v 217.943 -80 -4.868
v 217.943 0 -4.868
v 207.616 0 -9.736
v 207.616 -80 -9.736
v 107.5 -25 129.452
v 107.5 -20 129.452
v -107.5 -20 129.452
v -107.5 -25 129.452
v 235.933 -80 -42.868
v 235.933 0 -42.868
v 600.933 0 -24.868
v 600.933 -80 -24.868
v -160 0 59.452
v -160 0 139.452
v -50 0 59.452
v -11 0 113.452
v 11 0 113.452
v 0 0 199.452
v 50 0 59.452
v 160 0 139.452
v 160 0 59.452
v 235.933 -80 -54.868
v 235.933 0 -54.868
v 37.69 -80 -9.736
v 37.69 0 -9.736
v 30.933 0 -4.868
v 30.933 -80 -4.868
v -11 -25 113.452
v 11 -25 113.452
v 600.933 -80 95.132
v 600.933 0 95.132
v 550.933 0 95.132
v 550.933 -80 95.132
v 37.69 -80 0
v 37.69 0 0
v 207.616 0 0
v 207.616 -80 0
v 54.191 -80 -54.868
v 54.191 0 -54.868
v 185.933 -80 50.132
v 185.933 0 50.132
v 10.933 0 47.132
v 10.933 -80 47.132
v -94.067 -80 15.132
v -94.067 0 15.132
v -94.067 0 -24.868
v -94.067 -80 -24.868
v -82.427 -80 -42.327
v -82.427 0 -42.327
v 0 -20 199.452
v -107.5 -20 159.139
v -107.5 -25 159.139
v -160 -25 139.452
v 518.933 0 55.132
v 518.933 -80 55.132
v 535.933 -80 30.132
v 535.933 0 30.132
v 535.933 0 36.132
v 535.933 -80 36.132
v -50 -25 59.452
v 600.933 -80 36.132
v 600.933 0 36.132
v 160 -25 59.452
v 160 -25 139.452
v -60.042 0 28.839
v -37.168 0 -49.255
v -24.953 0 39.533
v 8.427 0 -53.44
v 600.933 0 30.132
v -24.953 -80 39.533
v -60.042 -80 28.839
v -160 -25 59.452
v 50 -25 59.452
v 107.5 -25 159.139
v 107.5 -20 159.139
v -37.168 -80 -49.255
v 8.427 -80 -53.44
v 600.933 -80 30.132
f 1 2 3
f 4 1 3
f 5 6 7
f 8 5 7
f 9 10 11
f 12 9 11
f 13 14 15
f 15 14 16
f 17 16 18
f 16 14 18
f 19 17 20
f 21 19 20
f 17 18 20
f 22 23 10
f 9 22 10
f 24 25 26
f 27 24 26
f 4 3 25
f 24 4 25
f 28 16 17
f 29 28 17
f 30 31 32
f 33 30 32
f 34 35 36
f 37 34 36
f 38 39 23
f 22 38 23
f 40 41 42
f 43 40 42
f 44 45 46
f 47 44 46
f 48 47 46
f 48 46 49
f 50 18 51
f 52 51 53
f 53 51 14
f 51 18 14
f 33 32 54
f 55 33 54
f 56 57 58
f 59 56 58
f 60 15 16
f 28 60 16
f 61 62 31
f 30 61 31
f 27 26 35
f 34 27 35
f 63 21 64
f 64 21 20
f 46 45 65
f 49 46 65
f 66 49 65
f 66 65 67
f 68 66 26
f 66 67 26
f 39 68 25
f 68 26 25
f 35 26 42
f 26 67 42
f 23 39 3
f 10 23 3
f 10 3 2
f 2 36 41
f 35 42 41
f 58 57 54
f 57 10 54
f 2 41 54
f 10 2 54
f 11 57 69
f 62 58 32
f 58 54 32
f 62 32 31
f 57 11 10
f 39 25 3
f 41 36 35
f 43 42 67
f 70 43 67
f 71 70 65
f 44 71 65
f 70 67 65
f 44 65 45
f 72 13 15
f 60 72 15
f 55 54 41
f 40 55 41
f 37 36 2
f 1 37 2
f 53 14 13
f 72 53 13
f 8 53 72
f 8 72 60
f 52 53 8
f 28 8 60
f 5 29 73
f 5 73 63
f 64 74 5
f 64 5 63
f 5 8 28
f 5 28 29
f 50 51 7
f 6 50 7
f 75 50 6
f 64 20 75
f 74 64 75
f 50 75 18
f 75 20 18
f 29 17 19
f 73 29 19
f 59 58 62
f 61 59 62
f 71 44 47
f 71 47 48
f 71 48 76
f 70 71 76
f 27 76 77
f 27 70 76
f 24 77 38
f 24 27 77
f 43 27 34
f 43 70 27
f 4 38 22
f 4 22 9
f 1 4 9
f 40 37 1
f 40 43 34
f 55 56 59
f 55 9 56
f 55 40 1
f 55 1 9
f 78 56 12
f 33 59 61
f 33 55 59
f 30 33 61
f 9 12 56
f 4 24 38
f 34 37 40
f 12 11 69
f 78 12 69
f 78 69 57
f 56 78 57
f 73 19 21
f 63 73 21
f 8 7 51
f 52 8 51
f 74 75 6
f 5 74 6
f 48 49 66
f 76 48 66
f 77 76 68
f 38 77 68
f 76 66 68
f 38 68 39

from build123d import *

# Parameters (mm, degrees)
F1_DEPTH = 80
F3_DEPTH = 25
F4_DEPTH = 20


with BuildPart() as f1:
    # F0 (on Front) → F1 (new body)
    with BuildSketch(Plane.XZ):
        with BuildLine():
            Line((10.933332, 47.13218), (-94.066668, 15.13218))
            Line((-94.066668, 15.13218), (-94.066668, -24.86782))
            Line((-94.066668, -24.86782), (-82.427307, -42.326861))
            ThreePointArc((-82.427307, -42.326861), (-14.401986, -51.691588), (54.191409, -54.86782))
            Line((54.191409, -54.86782), (55.717245, -54.86782))
            Line((55.717245, -54.86782), (235.933332, -54.86782))
            Line((235.933332, -54.86782), (235.933332, -42.86782))
            Line((235.933332, -42.86782), (600.933332, -24.86782))
            Line((600.933332, -24.86782), (600.933332, 30.13218))
            Line((600.933332, 30.13218), (535.933332, 30.13218))
            Line((535.933332, 30.13218), (535.933332, 36.13218))
            Line((535.933332, 36.13218), (600.933332, 36.13218))
            Line((600.933332, 36.13218), (600.933332, 95.13218))
            Line((600.933332, 95.13218), (550.933332, 95.13218))
            Line((550.933332, 95.13218), (518.933332, 55.13218))
            Line((518.933332, 55.13218), (185.933332, 50.13218))
            Line((185.933332, 50.13218), (10.933332, 47.13218))
        make_face()
        Polygon((37.689517, -9.735639), (30.933332, -4.86782), (37.689517, 0), (207.61624, 0), (217.942923, -4.86782), (207.61624, -9.735639), align=None, mode=Mode.SUBTRACT)
        with BuildLine():
            ThreePointArc((10.933332, 47.13218), (-42.613919, 34.568475), (-94.066668, 15.13218))
            Line((-94.066668, 15.13218), (10.933332, 47.13218))
        make_face()
    extrude(amount=F1_DEPTH)


with BuildPart() as f3:
    # F2 (on Front) → F3 (new body)
    with BuildSketch(Plane.XZ):
        Polygon((-11, 113.451787), (0, 113.451787), (11, 113.451787), (50, 59.451787), (160, 59.451787), (160, 139.451787), (107.5, 159.139287), (107.5, 129.451787), (0, 129.451787), (-107.5, 129.451787), (-107.5, 159.139287), (-160, 139.451787), (-160, 59.451787), (-50, 59.451787), align=None)
    extrude(amount=F3_DEPTH)

    # F2 (on Front) → F4 (join)
    with BuildSketch(Plane.XZ):
        Polygon((0, 199.451787), (-107.5, 159.139287), (-107.5, 129.451787), (0, 129.451787), (107.5, 129.451787), (107.5, 159.139287), align=None)
    extrude(amount=F4_DEPTH)


solid = Compound([f1.part, f3.part])
